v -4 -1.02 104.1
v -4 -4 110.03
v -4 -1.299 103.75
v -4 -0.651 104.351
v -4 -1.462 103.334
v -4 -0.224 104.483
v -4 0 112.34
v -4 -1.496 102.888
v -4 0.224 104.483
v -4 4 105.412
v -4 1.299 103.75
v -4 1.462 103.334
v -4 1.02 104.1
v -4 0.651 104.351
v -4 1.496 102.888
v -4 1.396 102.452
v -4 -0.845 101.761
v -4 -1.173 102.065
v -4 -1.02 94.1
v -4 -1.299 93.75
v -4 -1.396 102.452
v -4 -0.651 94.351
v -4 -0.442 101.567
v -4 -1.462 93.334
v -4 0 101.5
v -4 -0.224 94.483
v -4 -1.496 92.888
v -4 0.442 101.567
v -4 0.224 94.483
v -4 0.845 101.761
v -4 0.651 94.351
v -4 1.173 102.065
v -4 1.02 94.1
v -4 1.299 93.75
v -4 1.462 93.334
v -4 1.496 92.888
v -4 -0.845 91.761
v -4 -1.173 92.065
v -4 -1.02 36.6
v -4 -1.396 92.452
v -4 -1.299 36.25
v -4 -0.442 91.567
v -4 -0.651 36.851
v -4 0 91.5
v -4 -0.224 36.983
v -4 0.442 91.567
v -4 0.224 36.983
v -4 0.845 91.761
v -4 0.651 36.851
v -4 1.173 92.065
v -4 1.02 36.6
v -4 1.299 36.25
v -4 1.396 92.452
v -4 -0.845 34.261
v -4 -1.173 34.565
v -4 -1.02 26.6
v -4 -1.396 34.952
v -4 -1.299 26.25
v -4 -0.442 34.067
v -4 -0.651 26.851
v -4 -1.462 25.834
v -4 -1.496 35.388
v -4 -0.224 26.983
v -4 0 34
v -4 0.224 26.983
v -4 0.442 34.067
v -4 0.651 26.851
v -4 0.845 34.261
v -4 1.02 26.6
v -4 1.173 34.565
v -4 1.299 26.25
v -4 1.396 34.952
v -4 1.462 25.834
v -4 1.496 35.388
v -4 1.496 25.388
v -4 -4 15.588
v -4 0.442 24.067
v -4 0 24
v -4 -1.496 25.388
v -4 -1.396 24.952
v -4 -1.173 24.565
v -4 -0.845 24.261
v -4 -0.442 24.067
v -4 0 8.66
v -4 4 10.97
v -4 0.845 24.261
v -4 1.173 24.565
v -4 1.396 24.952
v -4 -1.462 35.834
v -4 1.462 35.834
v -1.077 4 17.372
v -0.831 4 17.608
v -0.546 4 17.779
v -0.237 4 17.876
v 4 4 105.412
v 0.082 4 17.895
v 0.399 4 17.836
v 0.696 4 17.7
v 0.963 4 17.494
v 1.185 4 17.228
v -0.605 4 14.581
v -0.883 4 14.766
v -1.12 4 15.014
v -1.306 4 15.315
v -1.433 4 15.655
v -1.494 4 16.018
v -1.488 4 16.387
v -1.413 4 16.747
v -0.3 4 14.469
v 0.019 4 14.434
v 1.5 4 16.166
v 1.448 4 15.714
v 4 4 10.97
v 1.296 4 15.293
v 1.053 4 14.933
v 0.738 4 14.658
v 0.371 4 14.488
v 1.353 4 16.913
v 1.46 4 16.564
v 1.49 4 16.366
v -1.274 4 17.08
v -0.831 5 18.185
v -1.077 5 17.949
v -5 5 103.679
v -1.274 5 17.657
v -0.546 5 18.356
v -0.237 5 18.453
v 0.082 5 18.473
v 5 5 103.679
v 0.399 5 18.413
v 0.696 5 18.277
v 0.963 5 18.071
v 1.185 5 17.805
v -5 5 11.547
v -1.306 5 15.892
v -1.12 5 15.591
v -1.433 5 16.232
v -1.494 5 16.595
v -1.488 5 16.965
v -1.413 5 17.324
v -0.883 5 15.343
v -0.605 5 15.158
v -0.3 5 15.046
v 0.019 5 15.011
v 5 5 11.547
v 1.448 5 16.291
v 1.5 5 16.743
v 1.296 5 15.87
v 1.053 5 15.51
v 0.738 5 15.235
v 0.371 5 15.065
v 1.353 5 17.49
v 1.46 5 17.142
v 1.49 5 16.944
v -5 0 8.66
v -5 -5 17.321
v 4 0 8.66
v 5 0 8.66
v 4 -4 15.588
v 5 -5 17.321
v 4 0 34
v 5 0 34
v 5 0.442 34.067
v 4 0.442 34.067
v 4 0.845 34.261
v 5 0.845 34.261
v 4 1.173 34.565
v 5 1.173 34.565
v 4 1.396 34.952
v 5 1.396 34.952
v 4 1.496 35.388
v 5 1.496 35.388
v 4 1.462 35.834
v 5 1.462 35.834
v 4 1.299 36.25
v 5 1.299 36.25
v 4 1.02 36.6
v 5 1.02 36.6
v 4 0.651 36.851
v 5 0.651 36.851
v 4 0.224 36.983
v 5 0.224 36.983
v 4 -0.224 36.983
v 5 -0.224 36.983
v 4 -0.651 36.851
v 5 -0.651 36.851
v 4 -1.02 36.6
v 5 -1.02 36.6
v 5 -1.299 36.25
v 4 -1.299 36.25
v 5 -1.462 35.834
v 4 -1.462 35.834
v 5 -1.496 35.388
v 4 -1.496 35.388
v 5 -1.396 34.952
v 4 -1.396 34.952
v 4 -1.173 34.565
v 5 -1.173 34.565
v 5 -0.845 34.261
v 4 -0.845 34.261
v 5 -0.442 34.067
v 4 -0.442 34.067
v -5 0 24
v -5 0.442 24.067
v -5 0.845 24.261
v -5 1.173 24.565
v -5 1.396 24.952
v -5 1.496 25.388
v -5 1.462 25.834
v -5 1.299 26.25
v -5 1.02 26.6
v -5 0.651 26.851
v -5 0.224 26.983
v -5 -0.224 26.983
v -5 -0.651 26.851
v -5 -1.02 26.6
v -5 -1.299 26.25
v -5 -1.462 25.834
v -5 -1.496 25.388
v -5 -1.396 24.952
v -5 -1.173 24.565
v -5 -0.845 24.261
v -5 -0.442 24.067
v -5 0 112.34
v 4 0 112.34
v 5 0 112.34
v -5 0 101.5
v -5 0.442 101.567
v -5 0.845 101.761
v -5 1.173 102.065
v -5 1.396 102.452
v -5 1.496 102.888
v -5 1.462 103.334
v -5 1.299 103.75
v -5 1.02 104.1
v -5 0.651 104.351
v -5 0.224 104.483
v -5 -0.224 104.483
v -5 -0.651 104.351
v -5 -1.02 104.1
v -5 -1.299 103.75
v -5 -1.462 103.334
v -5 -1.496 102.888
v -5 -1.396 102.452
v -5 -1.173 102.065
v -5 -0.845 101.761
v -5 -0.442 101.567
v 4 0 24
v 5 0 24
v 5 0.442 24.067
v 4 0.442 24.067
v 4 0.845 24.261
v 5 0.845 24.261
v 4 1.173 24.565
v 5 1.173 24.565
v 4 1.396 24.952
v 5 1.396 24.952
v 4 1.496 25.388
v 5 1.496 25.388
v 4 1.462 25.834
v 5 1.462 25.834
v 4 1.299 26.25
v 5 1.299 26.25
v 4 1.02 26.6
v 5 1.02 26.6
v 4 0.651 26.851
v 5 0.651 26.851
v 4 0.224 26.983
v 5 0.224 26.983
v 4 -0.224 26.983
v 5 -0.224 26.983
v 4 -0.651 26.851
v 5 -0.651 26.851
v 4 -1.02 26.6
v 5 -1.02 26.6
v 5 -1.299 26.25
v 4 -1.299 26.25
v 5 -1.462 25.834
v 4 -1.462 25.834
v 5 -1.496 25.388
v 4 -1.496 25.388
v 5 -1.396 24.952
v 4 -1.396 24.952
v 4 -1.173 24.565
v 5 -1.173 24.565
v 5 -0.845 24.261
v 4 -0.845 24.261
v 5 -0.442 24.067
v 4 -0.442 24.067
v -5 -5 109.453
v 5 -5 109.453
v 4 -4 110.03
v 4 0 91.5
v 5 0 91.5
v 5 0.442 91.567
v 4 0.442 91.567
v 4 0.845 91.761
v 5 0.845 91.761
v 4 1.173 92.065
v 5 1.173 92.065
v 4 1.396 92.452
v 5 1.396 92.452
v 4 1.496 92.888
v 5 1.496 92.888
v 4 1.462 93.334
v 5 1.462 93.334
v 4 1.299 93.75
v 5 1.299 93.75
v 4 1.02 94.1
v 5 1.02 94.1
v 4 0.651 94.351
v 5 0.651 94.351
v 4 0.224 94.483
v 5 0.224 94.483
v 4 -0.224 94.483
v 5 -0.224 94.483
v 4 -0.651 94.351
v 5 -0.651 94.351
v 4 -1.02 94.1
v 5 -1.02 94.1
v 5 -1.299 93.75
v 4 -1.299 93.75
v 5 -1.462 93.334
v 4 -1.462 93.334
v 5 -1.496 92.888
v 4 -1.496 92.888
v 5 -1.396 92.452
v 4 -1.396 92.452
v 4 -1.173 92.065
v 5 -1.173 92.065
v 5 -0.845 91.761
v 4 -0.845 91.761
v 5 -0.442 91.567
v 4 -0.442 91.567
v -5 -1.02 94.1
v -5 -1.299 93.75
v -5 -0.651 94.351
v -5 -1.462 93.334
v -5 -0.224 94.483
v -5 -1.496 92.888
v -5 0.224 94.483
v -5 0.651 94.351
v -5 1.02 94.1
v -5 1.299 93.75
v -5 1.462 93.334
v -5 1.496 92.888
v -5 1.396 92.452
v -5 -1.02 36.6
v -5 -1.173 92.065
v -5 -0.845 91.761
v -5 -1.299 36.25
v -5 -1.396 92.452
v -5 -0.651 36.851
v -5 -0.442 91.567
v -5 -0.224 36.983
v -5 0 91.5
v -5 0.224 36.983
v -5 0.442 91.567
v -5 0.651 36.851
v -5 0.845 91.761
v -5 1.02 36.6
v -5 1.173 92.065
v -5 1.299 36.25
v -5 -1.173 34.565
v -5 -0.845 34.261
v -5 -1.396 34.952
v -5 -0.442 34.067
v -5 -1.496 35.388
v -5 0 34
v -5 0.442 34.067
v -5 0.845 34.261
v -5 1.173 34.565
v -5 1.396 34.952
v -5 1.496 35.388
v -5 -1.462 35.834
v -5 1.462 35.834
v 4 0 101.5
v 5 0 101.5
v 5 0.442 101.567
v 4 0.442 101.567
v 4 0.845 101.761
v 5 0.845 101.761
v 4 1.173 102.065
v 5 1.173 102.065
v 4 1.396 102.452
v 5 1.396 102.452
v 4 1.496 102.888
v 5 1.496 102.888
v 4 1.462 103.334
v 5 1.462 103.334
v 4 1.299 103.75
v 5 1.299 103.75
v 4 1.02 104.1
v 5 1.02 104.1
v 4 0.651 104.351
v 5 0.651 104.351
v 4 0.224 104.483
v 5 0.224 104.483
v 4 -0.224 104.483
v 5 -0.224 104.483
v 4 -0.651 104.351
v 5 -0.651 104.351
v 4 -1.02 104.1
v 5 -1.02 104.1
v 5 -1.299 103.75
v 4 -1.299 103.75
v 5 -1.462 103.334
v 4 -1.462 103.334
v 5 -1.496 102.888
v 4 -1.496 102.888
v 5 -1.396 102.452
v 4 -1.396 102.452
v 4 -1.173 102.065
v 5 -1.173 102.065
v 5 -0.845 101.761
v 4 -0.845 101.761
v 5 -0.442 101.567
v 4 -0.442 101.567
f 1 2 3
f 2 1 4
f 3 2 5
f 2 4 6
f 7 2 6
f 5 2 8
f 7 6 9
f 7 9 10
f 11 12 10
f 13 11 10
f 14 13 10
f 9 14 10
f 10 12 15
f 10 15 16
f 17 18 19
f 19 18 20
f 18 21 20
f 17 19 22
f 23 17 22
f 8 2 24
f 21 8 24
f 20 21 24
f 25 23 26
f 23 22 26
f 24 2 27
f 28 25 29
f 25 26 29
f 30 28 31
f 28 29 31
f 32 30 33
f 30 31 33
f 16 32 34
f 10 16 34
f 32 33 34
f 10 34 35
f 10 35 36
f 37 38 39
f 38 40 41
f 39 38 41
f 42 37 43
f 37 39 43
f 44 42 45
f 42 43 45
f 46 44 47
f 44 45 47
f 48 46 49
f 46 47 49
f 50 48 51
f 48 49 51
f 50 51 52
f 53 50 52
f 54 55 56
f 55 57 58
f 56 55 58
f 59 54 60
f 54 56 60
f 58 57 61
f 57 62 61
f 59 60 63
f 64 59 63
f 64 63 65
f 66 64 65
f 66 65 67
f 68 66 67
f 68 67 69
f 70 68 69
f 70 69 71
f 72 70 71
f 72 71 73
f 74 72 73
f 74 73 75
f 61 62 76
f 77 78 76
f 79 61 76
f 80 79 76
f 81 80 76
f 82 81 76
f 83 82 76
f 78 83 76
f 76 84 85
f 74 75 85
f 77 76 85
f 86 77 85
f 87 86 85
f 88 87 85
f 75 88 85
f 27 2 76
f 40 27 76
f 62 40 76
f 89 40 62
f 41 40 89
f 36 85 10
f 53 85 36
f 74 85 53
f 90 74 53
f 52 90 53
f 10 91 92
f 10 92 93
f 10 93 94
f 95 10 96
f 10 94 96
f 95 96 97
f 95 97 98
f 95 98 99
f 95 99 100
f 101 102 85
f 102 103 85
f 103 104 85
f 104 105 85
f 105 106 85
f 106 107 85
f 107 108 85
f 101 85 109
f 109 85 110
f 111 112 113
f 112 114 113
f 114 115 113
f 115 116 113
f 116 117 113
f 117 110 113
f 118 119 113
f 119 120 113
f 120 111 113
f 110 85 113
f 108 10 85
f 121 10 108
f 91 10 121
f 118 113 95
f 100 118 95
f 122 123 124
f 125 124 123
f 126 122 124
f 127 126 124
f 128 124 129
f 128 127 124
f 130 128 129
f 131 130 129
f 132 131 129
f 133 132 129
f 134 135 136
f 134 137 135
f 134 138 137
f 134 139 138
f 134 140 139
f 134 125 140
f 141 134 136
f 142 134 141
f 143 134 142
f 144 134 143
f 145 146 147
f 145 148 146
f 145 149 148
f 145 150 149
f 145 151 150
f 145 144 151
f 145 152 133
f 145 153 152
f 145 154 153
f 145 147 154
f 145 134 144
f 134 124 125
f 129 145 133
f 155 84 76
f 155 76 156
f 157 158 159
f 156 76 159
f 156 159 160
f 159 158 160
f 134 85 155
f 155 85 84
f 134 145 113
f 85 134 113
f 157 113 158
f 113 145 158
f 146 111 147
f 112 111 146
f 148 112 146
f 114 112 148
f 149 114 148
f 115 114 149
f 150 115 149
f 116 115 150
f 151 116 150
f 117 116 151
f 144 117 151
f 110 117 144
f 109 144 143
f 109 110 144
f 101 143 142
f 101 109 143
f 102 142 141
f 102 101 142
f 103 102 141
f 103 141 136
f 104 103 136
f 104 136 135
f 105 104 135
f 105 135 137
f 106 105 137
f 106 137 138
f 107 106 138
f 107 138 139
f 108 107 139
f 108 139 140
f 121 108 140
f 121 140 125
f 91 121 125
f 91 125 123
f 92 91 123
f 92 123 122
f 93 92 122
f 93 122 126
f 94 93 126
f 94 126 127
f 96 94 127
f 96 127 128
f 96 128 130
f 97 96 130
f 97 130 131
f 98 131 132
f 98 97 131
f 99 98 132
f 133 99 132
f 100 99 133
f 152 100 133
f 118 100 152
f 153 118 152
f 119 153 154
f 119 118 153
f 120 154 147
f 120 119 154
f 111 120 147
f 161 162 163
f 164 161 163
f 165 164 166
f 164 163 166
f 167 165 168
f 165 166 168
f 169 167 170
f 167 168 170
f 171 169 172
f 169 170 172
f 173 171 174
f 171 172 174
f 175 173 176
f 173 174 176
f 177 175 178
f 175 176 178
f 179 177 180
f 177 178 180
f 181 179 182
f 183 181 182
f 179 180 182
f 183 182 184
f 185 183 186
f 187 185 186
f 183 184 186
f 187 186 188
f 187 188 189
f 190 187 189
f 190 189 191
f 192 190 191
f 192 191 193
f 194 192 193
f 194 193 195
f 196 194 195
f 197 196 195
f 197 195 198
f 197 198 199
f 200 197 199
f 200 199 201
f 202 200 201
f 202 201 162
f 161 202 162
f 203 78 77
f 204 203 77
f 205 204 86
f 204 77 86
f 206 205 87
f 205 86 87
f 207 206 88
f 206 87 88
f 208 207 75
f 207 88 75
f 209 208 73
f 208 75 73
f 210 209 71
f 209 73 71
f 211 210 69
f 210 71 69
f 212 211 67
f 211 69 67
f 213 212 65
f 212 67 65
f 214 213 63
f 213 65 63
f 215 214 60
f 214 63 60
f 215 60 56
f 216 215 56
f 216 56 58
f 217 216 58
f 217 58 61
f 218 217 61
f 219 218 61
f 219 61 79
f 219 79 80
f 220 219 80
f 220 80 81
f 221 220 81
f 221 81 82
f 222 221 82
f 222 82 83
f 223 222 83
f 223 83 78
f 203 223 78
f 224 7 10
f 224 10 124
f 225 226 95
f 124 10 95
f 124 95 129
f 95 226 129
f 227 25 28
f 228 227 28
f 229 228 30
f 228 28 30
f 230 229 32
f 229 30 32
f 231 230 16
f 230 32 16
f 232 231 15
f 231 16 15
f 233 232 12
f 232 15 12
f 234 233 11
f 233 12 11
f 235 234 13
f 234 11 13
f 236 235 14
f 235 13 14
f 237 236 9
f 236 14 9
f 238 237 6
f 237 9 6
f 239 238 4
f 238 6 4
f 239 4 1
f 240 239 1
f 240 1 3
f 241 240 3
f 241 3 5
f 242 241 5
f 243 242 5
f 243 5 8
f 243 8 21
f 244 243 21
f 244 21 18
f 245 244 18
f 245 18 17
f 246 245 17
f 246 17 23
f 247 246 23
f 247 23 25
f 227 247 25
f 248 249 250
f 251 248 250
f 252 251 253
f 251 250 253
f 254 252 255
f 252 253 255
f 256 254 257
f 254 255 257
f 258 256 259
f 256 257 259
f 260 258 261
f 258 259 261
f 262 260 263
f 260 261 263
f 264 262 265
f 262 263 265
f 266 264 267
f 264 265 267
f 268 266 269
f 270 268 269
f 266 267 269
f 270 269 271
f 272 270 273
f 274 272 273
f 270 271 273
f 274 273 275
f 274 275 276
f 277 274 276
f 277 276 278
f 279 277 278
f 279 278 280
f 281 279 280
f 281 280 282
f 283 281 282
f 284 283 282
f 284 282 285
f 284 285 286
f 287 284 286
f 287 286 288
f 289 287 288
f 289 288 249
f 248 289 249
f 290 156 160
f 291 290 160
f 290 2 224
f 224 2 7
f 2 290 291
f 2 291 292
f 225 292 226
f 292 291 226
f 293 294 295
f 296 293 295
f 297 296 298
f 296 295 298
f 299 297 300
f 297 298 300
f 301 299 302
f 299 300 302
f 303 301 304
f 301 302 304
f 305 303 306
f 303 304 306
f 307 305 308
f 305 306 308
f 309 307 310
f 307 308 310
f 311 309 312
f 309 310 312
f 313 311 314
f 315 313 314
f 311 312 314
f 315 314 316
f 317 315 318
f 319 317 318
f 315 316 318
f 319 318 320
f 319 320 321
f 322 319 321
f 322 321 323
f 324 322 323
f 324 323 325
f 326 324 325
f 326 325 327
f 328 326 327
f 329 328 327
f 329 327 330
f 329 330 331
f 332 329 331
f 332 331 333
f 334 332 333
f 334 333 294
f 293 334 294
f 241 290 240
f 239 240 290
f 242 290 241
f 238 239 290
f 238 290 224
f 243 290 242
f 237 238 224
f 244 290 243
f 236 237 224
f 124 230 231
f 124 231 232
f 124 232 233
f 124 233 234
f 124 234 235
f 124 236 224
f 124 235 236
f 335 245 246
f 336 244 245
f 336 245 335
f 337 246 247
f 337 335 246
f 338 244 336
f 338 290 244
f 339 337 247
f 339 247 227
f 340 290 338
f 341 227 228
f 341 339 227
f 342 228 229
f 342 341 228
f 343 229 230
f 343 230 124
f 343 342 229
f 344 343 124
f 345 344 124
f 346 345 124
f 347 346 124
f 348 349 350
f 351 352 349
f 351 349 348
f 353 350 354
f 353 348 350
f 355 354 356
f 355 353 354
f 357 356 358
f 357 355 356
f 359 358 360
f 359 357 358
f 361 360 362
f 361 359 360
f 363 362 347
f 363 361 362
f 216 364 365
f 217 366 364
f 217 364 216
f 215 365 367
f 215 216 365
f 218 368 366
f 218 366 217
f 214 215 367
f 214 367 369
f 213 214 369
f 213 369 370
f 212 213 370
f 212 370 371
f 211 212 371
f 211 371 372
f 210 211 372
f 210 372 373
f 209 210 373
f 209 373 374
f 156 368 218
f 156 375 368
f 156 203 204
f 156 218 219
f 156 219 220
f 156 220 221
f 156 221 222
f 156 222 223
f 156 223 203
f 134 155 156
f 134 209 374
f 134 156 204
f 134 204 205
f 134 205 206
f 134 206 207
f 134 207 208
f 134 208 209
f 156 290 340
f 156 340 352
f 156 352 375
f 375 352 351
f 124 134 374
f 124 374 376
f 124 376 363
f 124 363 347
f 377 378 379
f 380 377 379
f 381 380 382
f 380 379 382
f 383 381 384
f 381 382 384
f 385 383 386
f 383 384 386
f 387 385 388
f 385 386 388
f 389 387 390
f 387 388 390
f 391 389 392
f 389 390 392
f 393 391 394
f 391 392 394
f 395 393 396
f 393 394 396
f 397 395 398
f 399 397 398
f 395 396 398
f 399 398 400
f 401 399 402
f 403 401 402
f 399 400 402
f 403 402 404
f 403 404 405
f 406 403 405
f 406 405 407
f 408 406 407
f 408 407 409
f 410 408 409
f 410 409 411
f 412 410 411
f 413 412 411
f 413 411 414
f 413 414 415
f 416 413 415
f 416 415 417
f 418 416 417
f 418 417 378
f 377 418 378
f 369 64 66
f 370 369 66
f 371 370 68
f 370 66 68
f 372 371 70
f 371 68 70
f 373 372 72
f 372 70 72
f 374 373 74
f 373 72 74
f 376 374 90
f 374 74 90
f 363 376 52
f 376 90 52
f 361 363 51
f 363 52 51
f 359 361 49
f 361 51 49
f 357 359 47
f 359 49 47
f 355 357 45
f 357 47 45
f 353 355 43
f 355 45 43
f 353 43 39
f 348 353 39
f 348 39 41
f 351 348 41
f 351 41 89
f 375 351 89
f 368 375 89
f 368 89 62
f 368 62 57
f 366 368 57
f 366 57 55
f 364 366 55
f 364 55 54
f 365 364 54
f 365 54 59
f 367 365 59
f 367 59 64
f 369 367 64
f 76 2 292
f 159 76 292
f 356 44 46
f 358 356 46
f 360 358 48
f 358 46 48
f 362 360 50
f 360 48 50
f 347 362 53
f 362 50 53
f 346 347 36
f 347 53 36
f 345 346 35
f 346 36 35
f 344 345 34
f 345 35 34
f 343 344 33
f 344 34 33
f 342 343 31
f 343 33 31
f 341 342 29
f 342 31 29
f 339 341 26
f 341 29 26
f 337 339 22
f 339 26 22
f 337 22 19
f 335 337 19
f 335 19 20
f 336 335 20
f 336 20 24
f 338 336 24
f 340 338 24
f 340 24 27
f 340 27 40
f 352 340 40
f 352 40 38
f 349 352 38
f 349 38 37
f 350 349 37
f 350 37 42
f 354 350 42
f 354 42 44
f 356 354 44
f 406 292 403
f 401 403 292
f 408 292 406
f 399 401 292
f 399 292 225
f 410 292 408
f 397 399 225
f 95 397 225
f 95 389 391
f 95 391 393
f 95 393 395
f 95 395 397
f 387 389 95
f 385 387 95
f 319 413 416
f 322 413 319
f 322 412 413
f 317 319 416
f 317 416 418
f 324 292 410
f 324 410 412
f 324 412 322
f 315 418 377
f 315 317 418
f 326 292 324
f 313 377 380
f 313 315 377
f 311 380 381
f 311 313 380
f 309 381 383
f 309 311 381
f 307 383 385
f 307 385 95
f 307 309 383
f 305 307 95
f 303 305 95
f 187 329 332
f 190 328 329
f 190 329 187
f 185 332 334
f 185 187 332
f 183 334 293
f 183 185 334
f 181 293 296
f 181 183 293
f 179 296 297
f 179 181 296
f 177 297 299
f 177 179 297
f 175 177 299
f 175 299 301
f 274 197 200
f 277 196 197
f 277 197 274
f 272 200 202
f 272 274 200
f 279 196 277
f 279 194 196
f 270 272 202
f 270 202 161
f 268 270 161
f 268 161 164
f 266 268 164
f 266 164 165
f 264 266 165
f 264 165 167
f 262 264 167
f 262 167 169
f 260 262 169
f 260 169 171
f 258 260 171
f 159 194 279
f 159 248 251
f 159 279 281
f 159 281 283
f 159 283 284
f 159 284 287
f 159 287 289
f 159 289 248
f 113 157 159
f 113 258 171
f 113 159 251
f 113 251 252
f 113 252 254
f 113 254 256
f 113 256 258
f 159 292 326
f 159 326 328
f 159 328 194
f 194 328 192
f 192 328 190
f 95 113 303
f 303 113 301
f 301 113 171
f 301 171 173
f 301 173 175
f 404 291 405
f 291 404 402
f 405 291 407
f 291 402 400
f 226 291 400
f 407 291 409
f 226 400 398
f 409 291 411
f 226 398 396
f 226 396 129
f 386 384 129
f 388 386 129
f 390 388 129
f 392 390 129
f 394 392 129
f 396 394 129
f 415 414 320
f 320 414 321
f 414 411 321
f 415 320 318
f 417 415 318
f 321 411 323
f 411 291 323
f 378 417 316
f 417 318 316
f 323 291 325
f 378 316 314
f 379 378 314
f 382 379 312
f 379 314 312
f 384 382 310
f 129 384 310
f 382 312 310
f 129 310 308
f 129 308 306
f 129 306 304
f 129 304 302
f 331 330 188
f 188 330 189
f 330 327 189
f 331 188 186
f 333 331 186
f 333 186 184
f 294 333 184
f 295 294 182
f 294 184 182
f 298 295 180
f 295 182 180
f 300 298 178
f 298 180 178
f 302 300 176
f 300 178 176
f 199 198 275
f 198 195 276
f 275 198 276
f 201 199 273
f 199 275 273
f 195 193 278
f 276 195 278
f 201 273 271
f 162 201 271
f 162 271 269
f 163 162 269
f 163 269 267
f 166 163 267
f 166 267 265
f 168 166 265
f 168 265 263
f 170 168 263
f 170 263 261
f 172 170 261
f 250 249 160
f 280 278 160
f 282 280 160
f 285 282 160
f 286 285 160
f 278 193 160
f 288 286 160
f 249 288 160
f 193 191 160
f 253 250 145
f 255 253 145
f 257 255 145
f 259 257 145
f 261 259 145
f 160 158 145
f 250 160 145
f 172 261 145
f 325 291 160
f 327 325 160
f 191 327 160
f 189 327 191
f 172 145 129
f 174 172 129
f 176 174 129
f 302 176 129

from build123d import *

# Parameters (mm, degrees)
SKETCH_1_W               = 10
SKETCH_1_H               = 10
SKETCH_1_W_2             = 8
SKETCH_1_H_2             = 8
EXTRUDE_1_DEPTH          = 121
SKETCH_2_R               = 1.5
CUT_EXTRUDE_1_DEPTH      = 11
SKETCH_3_R               = 1.5
CUT_EXTRUDE_2_DEPTH      = 51.396370289
CUT_EXTRUDE_2_DEPTH_BACK = 11.103629711


with BuildPart() as part:
    # 草图1 → 拉伸-薄壁1 (new body)
    with BuildSketch(Plane.XY):
        Rectangle(SKETCH_1_W, SKETCH_1_H)
        Rectangle(SKETCH_1_W_2, SKETCH_1_H_2, mode=Mode.SUBTRACT)
    extrude(amount=EXTRUDE_1_DEPTH)

    # 草图2 → 切除-拉伸1 (cut, through all)
    with BuildSketch(Plane(origin=(5, 0, 0), x_dir=(0, 0, -1), z_dir=(1, 0, 0))):
        with Locations((-103, 0)):
            Circle(SKETCH_2_R)
        with Locations((-35.5, 0)):
            Circle(SKETCH_2_R)
        with Locations((-25.5, 0)):
            Circle(SKETCH_2_R)
        with Locations((-93, 0)):
            Circle(SKETCH_2_R)
        Polygon((-112.339745962, 0), (-103.679491924, 5), (-121, 5), (-121, -5), (-109.452994616, -5), align=None)
        Polygon((-8.660254038, 0), (-17.320508076, -5), (0, -5), (0, 5), (-11.547005384, 5), align=None)
    extrude(amount=-CUT_EXTRUDE_1_DEPTH, mode=Mode.SUBTRACT)

    # 草图3 → 切除-拉伸2 (cut, two sides)
    with BuildSketch(Plane(origin=(0, 8.75, 5.051814855), x_dir=(1, 0, 0), z_dir=(0, 0.866025404, 0.5))) as cut_extrude_2_sk:
        with Locations((0, -12)):
            Circle(SKETCH_3_R)
    extrude(amount=CUT_EXTRUDE_2_DEPTH, mode=Mode.SUBTRACT)
    extrude(cut_extrude_2_sk.sketch, amount=-CUT_EXTRUDE_2_DEPTH_BACK, mode=Mode.SUBTRACT)


solid = part.part
